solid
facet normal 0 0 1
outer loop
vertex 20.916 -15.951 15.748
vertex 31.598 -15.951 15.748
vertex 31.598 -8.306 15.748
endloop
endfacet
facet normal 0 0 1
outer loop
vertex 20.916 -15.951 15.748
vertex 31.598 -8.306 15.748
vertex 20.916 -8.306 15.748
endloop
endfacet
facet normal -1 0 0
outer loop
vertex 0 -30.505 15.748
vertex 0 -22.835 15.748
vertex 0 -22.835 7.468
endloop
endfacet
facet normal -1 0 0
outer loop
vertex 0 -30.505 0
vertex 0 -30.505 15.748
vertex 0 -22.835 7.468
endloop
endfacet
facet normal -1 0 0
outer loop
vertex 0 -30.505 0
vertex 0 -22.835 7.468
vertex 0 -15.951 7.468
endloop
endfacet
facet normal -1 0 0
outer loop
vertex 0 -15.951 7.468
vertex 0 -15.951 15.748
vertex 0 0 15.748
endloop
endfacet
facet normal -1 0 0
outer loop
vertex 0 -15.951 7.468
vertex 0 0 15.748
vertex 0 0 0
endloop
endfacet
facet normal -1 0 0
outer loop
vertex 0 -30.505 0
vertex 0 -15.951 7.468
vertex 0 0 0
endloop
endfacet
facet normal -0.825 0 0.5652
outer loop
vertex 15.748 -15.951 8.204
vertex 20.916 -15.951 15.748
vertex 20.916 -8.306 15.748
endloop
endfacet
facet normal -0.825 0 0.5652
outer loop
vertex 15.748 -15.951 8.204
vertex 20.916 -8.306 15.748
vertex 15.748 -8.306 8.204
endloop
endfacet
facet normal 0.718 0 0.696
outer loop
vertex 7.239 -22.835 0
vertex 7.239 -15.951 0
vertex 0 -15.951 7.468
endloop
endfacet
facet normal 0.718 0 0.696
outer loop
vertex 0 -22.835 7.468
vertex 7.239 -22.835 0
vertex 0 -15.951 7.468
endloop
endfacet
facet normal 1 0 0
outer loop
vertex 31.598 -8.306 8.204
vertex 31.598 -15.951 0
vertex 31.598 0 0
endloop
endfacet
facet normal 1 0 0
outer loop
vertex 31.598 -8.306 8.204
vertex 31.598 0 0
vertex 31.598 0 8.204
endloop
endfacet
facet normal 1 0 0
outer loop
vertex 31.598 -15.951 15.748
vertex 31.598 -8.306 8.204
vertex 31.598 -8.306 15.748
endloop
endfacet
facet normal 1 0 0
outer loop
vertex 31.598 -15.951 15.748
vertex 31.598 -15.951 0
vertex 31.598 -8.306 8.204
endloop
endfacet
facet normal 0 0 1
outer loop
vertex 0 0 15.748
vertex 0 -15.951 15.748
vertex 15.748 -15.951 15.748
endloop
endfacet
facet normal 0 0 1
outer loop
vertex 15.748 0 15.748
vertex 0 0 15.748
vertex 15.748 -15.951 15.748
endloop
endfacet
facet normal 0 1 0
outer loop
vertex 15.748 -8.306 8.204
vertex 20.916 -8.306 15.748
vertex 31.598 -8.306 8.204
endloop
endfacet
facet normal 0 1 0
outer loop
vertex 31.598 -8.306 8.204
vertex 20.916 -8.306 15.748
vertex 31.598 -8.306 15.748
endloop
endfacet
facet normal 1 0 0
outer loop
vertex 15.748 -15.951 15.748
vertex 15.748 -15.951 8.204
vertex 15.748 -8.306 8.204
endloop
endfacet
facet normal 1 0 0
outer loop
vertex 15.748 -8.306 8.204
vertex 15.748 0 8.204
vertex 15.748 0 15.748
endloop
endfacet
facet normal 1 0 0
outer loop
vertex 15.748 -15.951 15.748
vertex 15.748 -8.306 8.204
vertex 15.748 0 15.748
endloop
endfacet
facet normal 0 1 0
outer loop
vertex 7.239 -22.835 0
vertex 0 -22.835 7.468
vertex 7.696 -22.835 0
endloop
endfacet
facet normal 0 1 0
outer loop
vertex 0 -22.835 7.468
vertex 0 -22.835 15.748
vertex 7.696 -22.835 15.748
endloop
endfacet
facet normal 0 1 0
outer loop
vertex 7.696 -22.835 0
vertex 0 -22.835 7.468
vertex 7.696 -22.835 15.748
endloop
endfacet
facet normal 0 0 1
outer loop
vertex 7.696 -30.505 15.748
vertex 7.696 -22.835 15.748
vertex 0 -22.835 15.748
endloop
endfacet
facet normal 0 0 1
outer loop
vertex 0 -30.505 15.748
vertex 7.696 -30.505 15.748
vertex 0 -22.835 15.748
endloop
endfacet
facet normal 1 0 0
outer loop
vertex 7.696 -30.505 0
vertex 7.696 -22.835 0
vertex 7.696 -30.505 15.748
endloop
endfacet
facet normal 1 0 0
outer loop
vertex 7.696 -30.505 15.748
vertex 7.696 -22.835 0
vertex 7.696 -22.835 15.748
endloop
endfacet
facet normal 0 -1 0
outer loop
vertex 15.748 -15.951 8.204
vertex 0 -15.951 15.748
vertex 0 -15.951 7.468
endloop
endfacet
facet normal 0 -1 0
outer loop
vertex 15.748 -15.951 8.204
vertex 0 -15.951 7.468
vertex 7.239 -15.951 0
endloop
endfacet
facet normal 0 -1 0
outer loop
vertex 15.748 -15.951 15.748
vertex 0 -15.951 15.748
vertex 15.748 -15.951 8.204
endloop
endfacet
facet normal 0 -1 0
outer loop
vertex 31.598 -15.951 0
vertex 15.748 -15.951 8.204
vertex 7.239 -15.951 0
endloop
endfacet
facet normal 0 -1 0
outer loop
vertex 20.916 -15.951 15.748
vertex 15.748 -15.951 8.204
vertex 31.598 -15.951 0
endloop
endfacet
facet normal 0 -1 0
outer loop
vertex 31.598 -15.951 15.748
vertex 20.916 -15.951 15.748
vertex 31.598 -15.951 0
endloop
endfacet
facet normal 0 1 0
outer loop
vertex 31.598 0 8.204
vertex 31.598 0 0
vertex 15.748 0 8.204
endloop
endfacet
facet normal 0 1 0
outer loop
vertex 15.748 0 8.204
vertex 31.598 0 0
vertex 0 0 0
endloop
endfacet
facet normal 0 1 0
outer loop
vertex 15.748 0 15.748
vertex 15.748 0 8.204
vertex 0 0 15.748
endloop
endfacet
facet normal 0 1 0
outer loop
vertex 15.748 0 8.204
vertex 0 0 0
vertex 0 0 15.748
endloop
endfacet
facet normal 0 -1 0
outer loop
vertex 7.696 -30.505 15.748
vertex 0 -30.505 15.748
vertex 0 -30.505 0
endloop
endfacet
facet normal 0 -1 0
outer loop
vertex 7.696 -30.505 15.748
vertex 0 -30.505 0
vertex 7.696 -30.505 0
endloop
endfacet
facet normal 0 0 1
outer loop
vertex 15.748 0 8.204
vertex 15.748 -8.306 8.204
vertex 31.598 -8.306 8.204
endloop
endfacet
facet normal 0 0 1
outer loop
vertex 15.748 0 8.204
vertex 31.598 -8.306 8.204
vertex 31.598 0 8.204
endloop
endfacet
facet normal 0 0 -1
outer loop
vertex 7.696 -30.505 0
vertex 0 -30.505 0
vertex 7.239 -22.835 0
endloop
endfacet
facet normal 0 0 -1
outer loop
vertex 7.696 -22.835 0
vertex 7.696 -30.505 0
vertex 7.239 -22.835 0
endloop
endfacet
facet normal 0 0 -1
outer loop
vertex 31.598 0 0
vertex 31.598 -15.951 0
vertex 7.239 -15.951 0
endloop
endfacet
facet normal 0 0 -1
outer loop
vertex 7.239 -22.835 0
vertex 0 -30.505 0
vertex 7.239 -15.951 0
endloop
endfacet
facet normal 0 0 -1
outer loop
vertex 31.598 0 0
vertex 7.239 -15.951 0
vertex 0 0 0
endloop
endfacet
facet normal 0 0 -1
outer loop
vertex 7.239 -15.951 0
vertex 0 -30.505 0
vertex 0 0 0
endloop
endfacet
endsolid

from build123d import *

# Parameters (mm, degrees)
F0_W     = 15.748
F0_H     = 15.748
F1_DEPTH = 15.9512
F3_DEPTH = 6.8834
F5_DEPTH = 7.6708
F6_W     = 15.9512
F6_H     = 8.2042
F7_DEPTH = 15.8496
F9_DEPTH = 7.6454


with BuildPart() as f1:
    # F0 (on Front) → F1 (new body)
    with BuildSketch(Plane.XZ):
        with Locations((7.874, 7.874)):
            Rectangle(F0_W, F0_H)
    extrude(amount=F1_DEPTH)

    # F2 (on face) → F3 (join)
    with BuildSketch(Plane.XZ.offset(15.9512)):
        Polygon((0, 7.4676), (0, 0), (7.239, 0), align=None)
    extrude(amount=F3_DEPTH)

    # F4 (on face) → F5 (join)
    with BuildSketch(Plane.XZ.offset(22.8346)):
        Polygon((0, 7.4676), (7.239, 0), (7.6962, 0), (7.6962, 15.748), (0, 15.748), align=None)
        Polygon((0, 7.4676), (0, 0), (7.239, 0), align=None)
    extrude(amount=F5_DEPTH)

    # F6 (on face) → F7 (join)
    with BuildSketch(Plane.YZ.offset(15.748)):
        with Locations((-7.9756, 4.1021)):
            Rectangle(F6_W, F6_H)
    extrude(amount=F7_DEPTH)

    # F8 (on face) → F9 (join)
    with BuildSketch(Plane.XZ.offset(15.9512)):
        Polygon((20.9155736628, 15.748), (15.748, 8.2042), (31.5976, 8.2042), (31.5976, 15.748), align=None)
    extrude(amount=-F9_DEPTH)


solid = f1.part
